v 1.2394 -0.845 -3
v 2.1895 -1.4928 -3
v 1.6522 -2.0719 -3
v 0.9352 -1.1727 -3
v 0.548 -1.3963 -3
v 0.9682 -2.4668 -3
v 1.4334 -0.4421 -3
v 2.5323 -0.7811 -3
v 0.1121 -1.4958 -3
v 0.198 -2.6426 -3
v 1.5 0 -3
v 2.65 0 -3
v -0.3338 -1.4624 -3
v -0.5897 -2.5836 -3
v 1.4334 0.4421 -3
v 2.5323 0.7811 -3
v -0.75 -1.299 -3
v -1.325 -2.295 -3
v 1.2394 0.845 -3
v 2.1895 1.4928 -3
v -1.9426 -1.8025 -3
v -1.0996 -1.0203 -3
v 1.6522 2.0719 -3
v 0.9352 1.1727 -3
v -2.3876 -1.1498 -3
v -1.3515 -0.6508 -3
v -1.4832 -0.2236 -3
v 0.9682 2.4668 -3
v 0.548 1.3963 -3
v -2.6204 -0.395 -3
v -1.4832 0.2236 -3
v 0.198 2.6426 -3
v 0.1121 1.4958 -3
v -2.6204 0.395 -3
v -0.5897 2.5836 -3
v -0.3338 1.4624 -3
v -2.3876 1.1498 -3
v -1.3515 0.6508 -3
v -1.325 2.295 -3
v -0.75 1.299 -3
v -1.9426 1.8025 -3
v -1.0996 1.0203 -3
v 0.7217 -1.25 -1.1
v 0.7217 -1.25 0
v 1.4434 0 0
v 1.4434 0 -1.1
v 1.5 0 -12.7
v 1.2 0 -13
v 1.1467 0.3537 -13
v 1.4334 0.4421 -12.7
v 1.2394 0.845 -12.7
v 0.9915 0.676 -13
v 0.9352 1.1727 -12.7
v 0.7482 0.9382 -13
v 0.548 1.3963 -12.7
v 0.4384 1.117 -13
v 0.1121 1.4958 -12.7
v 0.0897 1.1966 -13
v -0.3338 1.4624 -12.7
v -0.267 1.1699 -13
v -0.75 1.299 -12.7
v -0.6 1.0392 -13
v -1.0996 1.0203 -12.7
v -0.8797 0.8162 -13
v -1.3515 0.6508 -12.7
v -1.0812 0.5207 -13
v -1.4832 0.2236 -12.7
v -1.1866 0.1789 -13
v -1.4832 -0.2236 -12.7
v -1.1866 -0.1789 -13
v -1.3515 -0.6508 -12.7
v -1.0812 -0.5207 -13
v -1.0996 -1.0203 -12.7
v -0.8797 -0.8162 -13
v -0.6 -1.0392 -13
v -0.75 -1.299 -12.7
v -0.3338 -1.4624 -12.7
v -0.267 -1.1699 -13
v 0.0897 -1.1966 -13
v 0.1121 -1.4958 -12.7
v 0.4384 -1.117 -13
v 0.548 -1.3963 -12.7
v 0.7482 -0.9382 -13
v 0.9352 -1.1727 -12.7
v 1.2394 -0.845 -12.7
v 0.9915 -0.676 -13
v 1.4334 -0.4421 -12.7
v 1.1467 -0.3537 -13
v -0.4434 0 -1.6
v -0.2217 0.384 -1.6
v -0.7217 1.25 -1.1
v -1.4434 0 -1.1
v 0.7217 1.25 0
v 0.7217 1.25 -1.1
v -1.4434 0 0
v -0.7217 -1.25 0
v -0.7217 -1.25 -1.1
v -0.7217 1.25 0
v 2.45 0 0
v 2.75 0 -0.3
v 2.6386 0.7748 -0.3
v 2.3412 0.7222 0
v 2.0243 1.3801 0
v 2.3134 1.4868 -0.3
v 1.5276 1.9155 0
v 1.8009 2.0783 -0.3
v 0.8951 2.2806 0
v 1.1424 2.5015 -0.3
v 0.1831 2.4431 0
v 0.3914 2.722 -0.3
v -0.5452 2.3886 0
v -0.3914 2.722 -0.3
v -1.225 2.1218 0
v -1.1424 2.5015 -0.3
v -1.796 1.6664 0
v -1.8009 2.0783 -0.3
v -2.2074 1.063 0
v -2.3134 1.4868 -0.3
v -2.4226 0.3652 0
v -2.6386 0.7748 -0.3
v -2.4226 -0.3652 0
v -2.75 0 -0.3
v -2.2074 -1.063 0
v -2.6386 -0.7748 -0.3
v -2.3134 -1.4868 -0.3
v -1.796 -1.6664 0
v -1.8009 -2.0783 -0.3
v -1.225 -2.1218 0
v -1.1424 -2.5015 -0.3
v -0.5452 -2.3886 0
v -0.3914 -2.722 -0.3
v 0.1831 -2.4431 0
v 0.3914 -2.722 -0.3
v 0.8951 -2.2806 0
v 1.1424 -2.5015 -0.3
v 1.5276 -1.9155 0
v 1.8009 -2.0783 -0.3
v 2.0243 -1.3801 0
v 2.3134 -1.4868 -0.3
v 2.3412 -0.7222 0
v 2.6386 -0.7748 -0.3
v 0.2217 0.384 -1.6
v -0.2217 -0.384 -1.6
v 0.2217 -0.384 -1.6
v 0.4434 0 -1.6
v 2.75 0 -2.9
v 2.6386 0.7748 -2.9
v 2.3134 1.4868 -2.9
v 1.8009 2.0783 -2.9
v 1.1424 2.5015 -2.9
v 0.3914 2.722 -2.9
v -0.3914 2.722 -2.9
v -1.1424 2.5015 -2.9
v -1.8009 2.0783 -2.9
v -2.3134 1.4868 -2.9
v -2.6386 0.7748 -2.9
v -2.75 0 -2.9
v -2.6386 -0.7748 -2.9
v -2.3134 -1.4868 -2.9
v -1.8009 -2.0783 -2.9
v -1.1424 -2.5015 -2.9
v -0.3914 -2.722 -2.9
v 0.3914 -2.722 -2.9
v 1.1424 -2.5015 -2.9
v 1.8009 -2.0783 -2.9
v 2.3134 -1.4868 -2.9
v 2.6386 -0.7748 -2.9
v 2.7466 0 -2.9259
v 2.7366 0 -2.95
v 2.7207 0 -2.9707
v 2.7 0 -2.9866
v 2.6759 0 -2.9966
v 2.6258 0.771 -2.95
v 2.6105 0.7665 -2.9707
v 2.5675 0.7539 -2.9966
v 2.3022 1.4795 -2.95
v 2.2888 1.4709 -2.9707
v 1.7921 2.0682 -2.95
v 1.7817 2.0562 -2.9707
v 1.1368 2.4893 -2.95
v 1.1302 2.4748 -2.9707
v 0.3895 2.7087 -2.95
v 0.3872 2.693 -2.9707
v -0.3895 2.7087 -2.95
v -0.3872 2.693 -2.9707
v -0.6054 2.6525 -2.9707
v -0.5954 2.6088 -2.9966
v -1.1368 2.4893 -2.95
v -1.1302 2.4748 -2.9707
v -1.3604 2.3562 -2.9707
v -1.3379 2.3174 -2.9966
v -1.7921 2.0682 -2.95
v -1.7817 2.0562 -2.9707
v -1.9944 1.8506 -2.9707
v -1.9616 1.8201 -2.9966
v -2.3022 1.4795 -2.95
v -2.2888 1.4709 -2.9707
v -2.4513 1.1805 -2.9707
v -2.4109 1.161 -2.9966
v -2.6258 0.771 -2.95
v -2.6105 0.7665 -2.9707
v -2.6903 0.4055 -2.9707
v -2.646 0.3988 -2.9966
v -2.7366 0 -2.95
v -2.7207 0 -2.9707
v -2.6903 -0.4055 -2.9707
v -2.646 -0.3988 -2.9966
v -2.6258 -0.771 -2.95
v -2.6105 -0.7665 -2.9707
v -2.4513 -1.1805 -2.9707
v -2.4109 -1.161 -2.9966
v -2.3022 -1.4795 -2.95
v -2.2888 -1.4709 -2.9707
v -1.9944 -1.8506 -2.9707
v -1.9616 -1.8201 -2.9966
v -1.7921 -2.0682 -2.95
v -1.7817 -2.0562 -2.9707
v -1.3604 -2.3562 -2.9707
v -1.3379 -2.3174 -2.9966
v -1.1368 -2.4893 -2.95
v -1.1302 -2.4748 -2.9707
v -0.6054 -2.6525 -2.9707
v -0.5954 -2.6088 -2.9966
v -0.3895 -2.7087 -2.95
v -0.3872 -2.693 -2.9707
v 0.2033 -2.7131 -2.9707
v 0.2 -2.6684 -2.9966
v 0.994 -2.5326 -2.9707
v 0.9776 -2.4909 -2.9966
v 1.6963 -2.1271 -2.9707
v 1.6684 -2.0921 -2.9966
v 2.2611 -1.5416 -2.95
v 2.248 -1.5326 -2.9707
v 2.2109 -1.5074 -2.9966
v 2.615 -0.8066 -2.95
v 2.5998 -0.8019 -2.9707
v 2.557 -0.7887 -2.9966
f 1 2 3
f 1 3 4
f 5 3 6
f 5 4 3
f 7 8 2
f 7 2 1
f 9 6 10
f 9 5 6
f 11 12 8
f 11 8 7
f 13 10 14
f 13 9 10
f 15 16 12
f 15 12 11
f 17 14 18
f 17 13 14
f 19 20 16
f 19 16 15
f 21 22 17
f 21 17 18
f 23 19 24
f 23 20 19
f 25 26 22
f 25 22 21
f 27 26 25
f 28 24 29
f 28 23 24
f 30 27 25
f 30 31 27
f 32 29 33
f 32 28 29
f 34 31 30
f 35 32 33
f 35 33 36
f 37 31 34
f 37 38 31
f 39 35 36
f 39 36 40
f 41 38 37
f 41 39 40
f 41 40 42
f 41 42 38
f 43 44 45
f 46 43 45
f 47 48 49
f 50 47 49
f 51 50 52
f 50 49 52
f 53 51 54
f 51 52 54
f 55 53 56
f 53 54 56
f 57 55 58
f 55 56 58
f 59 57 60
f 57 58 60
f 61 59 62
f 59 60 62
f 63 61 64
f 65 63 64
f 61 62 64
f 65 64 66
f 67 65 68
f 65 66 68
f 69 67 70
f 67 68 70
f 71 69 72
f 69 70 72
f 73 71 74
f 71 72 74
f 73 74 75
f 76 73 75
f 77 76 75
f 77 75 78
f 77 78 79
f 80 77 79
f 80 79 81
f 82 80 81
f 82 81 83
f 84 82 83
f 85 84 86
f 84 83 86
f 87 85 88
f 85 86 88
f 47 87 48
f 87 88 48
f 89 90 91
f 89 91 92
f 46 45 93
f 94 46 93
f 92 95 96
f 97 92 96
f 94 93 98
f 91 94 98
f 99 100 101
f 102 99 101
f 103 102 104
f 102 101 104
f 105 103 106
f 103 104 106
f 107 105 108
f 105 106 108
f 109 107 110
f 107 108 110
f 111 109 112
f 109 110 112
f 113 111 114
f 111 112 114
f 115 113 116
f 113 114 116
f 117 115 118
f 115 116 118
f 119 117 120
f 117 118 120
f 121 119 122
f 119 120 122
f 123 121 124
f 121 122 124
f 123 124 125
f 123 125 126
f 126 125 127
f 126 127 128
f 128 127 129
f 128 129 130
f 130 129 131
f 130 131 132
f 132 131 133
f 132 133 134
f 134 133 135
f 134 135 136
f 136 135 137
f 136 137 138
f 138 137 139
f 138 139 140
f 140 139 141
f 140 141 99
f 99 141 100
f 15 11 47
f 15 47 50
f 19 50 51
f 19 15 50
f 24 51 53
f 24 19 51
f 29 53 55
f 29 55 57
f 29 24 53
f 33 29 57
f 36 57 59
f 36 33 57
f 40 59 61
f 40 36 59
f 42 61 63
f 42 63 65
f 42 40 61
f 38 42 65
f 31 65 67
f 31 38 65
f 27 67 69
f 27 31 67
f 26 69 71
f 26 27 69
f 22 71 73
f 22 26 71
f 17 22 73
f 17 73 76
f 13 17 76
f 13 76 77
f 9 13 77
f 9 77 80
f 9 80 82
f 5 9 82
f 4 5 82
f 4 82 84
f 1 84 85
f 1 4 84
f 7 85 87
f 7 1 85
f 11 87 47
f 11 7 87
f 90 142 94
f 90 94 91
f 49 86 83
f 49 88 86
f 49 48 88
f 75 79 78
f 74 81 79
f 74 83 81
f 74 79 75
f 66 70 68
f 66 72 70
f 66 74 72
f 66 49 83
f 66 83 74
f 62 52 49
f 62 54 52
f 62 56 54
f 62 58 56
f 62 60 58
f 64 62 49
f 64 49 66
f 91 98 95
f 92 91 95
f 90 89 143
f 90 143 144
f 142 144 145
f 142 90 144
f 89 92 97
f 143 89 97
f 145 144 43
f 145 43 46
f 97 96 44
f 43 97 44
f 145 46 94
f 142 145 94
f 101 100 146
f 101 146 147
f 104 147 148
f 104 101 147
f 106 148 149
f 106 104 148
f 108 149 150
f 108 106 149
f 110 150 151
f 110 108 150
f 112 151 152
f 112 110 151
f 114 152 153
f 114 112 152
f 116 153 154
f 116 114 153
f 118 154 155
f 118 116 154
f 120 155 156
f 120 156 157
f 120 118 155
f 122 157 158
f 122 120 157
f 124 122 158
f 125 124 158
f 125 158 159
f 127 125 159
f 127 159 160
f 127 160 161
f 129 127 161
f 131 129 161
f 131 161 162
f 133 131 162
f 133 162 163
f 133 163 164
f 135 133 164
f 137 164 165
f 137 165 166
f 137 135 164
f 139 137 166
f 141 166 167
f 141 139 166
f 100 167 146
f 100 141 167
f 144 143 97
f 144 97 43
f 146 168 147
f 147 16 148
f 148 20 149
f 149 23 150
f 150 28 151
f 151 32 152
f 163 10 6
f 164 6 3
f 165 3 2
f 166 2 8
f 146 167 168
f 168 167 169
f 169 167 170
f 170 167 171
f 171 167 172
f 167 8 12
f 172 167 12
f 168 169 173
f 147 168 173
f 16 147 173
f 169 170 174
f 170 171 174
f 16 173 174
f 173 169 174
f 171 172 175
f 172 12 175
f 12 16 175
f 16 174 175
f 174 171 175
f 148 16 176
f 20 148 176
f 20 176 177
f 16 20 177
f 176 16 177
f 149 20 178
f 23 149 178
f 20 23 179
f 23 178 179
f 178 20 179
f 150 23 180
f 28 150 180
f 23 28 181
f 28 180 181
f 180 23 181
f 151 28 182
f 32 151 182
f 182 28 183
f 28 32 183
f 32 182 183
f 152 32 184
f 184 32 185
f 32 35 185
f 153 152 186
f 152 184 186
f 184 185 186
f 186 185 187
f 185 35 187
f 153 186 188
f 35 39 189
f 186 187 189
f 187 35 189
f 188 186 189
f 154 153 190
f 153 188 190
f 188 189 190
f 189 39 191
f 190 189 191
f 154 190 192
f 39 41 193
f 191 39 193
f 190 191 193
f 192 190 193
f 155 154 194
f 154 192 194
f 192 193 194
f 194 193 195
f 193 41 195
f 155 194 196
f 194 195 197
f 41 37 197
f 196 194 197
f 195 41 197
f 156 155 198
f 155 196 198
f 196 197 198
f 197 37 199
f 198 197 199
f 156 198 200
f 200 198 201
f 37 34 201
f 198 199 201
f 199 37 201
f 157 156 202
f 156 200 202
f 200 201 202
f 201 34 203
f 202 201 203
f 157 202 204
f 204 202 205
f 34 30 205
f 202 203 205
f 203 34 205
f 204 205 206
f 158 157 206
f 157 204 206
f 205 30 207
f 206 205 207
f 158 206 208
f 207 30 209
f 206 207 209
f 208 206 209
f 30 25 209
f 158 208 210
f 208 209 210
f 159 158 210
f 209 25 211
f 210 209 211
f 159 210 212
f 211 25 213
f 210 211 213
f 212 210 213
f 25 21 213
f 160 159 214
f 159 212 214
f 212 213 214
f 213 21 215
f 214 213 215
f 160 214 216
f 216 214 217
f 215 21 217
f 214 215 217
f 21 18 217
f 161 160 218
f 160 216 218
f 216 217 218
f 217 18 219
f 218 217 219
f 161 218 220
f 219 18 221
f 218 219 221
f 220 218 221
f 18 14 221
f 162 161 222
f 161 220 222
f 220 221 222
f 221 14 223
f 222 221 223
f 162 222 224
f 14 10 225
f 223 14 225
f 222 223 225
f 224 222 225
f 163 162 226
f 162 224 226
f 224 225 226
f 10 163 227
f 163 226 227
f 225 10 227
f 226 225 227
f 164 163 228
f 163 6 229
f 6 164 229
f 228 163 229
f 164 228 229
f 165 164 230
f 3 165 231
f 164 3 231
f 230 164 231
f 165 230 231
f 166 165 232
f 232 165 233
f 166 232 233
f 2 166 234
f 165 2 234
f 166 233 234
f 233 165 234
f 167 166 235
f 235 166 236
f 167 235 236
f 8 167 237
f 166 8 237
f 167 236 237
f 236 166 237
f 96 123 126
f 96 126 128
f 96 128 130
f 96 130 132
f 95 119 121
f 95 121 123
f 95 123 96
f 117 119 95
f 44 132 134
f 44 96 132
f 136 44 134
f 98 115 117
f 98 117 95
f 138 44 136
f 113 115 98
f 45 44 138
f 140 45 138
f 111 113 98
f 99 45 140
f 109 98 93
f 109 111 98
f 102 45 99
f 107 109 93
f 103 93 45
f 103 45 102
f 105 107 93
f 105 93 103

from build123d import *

# Parameters (mm, degrees)
F3_DEPTH = 1.6
F4_SIZE2 = 0.8660254038
F4_SIZE  = 0.5
F5_SIZE  = 0.3
F6_R     = 0.1


with BuildPart() as f1:
    # F0 (on Front) → F1 (revolve)
    with BuildSketch(Plane.XZ):
        Polygon((2.75, 0), (0, 0), (0, -13), (1.5, -13), (1.5, -3), (2.75, -3), align=None)
    revolve(axis=Axis((0, 0, -6.5), (0, 0, 1)))

    # F2 (on face) → F3 (cut)
    with BuildSketch(Plane.XY):
        Polygon((0.7216878365, 1.25), (-0.7216878365, 1.25), (-1.443375673, 0), (-0.7216878365, -1.25), (0.7216878365, -1.25), (1.443375673, 0), align=None)
    extrude(amount=-F3_DEPTH, mode=Mode.SUBTRACT)

    # F4
    f4_edges = [f1.edges().sort_by_distance(p)[0] for p in [
        (0, 1.25, -1.6),
        (-1.082532, 0.625, -1.6),
        (-1.082532, -0.625, -1.6),
        (0, -1.25, -1.6),
        (1.082532, -0.625, -1.6),
        (1.082532, 0.625, -1.6),
    ]]
    chamfer(f4_edges, length=F4_SIZE, length2=F4_SIZE2)

    # F5
    f5_edges = [f1.edges().sort_by_distance(p)[0] for p in [
        (-2.75, 0, 0),
        (-1.5, 0, -13),
    ]]
    chamfer(f5_edges, length=F5_SIZE)

    # F6
    f6_edges = [f1.edges().sort_by_distance(p)[0] for p in [
        (-2.75, 0, -3),
    ]]
    fillet(f6_edges, radius=F6_R)


with BuildPart() as f7_1:
    # F7: copy of F1
    add(f1.part)


solid = f1.part
